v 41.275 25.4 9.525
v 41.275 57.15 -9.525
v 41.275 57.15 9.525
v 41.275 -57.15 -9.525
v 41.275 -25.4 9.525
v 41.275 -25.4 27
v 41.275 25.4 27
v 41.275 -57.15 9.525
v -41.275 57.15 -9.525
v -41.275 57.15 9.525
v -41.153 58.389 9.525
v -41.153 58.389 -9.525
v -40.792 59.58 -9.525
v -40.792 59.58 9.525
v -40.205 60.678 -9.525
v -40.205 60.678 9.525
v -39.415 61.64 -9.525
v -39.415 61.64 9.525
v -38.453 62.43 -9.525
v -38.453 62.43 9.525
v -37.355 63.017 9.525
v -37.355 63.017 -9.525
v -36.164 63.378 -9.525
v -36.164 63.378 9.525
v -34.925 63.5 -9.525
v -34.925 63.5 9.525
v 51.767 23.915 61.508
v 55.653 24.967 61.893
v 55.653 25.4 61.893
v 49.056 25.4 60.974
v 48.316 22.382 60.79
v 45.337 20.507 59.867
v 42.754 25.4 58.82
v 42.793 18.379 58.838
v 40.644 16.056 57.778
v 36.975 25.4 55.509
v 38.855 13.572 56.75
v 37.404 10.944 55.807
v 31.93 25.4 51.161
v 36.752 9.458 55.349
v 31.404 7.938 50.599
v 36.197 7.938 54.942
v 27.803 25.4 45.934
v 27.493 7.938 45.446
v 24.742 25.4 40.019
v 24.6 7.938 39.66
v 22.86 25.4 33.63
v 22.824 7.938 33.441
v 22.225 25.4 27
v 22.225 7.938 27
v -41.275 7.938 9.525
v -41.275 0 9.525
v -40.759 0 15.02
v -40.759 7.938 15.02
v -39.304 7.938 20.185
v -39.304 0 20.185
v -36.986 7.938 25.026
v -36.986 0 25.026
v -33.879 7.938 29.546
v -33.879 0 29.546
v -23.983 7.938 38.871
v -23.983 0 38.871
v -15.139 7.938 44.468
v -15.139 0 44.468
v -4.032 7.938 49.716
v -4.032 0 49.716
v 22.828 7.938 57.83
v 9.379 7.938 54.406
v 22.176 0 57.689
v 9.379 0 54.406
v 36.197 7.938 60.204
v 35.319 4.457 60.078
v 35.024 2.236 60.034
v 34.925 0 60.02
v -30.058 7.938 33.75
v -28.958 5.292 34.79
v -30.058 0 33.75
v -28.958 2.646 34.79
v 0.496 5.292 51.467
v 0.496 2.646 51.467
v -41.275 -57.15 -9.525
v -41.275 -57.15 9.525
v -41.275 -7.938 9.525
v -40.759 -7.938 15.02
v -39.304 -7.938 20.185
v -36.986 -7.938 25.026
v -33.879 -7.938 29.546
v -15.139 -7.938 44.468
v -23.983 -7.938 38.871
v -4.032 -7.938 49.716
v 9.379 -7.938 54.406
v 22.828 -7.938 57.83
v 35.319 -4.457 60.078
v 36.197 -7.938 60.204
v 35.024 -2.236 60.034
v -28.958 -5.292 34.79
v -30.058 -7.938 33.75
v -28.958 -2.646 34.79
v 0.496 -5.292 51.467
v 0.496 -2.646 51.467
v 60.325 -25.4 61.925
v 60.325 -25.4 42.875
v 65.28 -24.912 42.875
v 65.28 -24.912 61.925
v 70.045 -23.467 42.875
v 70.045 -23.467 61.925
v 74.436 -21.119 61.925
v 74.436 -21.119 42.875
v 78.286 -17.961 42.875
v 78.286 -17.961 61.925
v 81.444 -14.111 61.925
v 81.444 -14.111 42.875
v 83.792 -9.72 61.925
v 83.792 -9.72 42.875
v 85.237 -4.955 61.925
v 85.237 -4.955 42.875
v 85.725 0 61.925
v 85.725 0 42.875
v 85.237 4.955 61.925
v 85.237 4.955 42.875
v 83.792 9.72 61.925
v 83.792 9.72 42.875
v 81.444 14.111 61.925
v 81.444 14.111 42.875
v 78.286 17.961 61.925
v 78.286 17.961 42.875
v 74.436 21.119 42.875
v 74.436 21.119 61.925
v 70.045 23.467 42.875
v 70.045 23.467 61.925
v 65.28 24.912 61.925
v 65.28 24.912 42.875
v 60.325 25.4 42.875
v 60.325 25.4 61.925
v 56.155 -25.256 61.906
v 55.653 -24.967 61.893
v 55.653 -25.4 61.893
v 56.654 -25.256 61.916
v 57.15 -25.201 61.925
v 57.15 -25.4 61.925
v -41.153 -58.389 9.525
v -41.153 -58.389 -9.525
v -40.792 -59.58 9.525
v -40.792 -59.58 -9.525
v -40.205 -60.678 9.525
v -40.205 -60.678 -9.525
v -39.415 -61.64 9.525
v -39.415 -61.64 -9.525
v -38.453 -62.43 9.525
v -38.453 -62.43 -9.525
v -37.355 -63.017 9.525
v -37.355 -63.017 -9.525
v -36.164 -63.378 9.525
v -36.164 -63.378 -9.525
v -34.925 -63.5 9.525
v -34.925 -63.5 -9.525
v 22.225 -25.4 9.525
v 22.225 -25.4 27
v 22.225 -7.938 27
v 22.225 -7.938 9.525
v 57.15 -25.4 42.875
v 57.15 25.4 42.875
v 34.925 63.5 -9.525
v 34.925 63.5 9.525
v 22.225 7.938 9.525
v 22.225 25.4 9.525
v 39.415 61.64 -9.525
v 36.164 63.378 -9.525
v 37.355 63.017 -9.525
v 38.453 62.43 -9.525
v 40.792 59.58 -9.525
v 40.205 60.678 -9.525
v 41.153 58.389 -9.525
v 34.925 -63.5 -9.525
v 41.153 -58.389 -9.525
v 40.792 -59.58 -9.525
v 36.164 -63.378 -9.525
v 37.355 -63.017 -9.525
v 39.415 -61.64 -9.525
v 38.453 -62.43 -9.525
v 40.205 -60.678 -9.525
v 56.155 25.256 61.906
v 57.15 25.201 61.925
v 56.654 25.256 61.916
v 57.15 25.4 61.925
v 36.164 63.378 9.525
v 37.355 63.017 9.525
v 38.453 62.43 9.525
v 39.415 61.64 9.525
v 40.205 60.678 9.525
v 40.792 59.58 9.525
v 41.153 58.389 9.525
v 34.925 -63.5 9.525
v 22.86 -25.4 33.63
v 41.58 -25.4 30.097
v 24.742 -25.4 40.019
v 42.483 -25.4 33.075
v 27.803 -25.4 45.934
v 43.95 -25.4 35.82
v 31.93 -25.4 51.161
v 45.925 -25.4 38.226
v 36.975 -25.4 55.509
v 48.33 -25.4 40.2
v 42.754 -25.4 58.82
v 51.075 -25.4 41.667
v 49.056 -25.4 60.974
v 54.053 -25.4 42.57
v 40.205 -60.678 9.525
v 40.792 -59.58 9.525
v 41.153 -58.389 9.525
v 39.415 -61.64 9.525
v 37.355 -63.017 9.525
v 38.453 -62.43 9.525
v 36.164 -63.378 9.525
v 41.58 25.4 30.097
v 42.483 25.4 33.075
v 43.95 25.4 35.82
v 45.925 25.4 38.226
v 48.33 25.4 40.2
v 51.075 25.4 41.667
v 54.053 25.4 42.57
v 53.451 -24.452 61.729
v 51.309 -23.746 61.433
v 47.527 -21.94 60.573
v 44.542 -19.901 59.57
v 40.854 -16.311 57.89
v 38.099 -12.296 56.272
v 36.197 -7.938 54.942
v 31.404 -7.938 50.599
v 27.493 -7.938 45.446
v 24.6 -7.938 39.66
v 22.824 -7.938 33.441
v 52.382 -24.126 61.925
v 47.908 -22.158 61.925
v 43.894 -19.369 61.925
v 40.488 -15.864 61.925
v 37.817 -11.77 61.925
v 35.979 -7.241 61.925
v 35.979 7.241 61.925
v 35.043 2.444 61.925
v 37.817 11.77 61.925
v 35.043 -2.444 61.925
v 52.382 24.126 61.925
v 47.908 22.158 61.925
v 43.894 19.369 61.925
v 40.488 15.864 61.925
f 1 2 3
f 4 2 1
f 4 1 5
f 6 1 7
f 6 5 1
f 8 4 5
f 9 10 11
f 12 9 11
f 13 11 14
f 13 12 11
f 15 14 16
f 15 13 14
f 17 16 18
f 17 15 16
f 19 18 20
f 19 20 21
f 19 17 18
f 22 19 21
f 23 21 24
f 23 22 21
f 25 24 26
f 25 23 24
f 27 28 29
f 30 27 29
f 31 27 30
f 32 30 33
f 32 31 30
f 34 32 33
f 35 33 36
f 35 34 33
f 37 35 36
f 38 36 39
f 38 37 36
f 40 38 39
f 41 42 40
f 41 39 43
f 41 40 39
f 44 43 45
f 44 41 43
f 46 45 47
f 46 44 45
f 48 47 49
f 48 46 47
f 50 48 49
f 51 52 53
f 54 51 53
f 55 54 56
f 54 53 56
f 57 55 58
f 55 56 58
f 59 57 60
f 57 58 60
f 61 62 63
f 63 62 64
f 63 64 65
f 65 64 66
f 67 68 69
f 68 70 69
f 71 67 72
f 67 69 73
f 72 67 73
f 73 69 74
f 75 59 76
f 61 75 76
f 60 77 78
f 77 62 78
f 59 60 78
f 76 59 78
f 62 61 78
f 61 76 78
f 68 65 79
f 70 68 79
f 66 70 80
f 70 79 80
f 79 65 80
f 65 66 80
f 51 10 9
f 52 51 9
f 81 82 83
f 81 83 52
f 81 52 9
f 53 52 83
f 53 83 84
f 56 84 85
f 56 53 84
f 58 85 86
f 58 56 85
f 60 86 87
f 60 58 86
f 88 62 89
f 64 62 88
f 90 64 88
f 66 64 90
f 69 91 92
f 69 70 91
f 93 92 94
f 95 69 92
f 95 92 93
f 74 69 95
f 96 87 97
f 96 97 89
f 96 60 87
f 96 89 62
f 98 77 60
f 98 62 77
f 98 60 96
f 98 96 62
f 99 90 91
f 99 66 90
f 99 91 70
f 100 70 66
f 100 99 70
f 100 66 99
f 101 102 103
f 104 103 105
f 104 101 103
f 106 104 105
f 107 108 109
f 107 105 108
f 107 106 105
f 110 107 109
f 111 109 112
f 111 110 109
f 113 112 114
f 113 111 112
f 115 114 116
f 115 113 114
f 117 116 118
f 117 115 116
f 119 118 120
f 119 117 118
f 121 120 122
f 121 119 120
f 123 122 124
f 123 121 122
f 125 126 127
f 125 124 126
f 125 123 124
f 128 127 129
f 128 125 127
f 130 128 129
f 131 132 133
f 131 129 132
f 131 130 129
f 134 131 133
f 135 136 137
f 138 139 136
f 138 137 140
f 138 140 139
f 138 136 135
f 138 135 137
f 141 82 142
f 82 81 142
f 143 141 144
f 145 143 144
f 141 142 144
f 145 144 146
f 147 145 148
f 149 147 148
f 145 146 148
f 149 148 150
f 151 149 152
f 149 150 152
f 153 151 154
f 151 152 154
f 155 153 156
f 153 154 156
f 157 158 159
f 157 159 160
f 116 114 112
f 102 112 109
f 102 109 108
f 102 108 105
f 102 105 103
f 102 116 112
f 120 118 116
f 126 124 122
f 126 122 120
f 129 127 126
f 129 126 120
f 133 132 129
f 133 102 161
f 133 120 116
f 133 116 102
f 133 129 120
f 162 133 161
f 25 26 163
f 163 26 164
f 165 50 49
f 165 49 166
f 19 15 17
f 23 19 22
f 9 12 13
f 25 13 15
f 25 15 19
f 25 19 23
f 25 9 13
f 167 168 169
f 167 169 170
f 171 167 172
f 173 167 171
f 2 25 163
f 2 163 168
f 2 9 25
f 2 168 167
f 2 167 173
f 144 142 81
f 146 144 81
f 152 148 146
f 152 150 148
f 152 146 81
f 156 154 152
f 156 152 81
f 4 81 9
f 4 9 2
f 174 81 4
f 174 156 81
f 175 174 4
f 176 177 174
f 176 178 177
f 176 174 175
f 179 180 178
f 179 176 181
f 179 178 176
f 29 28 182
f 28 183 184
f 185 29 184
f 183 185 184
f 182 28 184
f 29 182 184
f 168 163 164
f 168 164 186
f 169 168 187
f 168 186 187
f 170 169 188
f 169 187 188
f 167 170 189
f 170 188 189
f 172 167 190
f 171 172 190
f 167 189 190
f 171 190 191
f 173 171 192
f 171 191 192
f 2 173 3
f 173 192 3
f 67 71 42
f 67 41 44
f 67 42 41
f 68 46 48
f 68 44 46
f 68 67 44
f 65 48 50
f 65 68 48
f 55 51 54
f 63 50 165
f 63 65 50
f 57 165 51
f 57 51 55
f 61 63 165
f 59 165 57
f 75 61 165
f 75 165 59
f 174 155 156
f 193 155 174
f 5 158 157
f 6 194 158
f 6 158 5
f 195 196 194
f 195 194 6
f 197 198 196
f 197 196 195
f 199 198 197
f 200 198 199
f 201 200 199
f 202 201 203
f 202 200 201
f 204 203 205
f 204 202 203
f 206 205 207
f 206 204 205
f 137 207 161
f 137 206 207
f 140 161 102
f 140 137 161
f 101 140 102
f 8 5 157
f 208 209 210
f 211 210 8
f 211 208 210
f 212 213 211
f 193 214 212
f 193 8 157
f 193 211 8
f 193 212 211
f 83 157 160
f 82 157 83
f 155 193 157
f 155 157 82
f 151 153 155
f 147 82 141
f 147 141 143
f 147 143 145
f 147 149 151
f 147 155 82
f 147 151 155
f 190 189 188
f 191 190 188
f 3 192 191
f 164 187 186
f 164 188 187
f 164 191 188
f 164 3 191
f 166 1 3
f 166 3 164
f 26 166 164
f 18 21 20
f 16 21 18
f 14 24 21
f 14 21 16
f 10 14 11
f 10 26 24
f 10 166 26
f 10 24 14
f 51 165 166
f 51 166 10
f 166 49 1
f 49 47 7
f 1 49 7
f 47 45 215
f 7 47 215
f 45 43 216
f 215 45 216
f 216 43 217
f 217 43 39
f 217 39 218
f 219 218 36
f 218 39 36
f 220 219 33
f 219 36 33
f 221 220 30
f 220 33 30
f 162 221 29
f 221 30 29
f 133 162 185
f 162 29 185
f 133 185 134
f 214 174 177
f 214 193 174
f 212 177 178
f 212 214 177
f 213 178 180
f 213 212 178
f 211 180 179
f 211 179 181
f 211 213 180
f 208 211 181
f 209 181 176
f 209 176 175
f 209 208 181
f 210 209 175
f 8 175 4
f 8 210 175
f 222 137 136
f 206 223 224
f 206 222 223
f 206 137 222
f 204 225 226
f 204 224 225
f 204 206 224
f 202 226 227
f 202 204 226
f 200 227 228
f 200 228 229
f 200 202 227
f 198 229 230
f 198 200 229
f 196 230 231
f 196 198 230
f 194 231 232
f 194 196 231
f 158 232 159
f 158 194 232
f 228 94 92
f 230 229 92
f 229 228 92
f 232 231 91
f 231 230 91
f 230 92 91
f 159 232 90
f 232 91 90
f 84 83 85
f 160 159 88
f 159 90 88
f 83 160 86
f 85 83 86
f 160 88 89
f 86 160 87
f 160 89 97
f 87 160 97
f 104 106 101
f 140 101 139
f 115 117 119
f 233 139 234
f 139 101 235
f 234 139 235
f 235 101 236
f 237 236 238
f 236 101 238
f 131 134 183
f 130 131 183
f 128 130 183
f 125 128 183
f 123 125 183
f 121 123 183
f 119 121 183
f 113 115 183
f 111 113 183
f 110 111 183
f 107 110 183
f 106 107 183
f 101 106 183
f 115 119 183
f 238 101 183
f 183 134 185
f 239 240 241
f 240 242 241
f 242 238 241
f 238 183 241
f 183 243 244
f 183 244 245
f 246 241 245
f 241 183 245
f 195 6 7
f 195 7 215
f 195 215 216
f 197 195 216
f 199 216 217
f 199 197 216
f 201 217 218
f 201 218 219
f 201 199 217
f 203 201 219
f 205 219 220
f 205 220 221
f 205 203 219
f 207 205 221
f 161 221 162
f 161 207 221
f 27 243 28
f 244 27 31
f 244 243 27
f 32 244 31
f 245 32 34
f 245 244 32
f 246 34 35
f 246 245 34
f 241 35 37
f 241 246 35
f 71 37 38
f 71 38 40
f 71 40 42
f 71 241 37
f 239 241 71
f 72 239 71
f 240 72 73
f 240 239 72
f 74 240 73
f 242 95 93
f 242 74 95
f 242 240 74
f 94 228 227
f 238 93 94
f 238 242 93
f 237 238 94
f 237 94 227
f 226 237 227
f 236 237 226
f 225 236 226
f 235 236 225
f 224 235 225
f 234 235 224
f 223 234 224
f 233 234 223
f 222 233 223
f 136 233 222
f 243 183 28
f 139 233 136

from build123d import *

# Parameters (mm, degrees)
F1_DEPTH = 63.5
F2_DEPTH = 25.4
F3_DEPTH = 7.9375
F0_W     = 25.4
F0_H     = 19.05
F5_R     = 6.35


with BuildPart() as f1:
    # F0 (on Front) → F1 (new body, symmetric)
    with BuildSketch(Plane.XZ):
        Polygon((-41.275, 9.525), (-41.275, -9.525), (41.275, -9.525), (41.275, 9.525), (22.225, 9.525), align=None)
    extrude(amount=F1_DEPTH, both=True)

    # F0 (on Front) → F2 (join, symmetric)
    with BuildSketch(Plane.XZ):
        with BuildLine():
            Line((22.225, 9.525), (41.275, 9.525))
            Line((41.275, 9.525), (41.275, 27.0002))
            ThreePointArc((41.275, 27.0002), (45.9246798487, 38.2255201513), (57.15, 42.8752))
            Line((57.15, 42.8752), (60.325, 42.8752))
            Line((60.325, 42.8752), (60.325, 61.9252))
            Line((60.325, 61.9252), (57.15, 61.9252))
            add(Edge.make_bspline(
                [(55.6525886726, 61.8930844368), (56.1562808572, 61.9065949604), (56.6554908346, 61.9172958156), (57.15, 61.9252)],
                knots=[109.9898733807, 109.9898733807, 109.9898733807, 109.9898733807, 111.5045361635, 111.5045361635, 111.5045361635, 111.5045361635], degree=3))
            ThreePointArc((55.6525886726, 61.8930844368), (31.9304370021, 51.1606897963), (22.225, 27.0002))
            Line((22.225, 27.0002), (22.225, 9.525))
        make_face()
    extrude(amount=F2_DEPTH, both=True)

    # F0 (on Front) → F3 (join, symmetric)
    with BuildSketch(Plane.XZ):
        with BuildLine():
            add(Edge.make_bspline(
                [(-41.275, 9.525), (-41.1359151521, 45.1149860549), (19.0761042936, 60.9119942548), (55.6525886726, 61.8930844368)],
                knots=[0, 0, 0, 0, 109.9898733807, 109.9898733807, 109.9898733807, 109.9898733807], degree=3))
            Line((-41.275, 9.525), (22.225, 9.525))
            Line((22.225, 9.525), (22.225, 27.0002))
            ThreePointArc((22.225, 27.0002), (31.9304370021, 51.1606897963), (55.6525886726, 61.8930844368))
        make_face()
    extrude(amount=F3_DEPTH, both=True)

    # F0 (on Front) → F4 (revolve)
    with BuildSketch(Plane.XZ):
        with Locations((73.025, 52.4002)):
            Rectangle(F0_W, F0_H)
    revolve(axis=Axis((60.325, 0, 52.3875), (0, 0, 1)))

    # F5
    f5_edges = [f1.edges().sort_by_distance(p)[0] for p in [
        (-41.275, 63.5, 0),
        (41.275, 63.5, 0),
        (-41.275, -63.5, 0),
        (41.275, -63.5, 0),
    ]]
    fillet(f5_edges, radius=F5_R)


solid = f1.part
